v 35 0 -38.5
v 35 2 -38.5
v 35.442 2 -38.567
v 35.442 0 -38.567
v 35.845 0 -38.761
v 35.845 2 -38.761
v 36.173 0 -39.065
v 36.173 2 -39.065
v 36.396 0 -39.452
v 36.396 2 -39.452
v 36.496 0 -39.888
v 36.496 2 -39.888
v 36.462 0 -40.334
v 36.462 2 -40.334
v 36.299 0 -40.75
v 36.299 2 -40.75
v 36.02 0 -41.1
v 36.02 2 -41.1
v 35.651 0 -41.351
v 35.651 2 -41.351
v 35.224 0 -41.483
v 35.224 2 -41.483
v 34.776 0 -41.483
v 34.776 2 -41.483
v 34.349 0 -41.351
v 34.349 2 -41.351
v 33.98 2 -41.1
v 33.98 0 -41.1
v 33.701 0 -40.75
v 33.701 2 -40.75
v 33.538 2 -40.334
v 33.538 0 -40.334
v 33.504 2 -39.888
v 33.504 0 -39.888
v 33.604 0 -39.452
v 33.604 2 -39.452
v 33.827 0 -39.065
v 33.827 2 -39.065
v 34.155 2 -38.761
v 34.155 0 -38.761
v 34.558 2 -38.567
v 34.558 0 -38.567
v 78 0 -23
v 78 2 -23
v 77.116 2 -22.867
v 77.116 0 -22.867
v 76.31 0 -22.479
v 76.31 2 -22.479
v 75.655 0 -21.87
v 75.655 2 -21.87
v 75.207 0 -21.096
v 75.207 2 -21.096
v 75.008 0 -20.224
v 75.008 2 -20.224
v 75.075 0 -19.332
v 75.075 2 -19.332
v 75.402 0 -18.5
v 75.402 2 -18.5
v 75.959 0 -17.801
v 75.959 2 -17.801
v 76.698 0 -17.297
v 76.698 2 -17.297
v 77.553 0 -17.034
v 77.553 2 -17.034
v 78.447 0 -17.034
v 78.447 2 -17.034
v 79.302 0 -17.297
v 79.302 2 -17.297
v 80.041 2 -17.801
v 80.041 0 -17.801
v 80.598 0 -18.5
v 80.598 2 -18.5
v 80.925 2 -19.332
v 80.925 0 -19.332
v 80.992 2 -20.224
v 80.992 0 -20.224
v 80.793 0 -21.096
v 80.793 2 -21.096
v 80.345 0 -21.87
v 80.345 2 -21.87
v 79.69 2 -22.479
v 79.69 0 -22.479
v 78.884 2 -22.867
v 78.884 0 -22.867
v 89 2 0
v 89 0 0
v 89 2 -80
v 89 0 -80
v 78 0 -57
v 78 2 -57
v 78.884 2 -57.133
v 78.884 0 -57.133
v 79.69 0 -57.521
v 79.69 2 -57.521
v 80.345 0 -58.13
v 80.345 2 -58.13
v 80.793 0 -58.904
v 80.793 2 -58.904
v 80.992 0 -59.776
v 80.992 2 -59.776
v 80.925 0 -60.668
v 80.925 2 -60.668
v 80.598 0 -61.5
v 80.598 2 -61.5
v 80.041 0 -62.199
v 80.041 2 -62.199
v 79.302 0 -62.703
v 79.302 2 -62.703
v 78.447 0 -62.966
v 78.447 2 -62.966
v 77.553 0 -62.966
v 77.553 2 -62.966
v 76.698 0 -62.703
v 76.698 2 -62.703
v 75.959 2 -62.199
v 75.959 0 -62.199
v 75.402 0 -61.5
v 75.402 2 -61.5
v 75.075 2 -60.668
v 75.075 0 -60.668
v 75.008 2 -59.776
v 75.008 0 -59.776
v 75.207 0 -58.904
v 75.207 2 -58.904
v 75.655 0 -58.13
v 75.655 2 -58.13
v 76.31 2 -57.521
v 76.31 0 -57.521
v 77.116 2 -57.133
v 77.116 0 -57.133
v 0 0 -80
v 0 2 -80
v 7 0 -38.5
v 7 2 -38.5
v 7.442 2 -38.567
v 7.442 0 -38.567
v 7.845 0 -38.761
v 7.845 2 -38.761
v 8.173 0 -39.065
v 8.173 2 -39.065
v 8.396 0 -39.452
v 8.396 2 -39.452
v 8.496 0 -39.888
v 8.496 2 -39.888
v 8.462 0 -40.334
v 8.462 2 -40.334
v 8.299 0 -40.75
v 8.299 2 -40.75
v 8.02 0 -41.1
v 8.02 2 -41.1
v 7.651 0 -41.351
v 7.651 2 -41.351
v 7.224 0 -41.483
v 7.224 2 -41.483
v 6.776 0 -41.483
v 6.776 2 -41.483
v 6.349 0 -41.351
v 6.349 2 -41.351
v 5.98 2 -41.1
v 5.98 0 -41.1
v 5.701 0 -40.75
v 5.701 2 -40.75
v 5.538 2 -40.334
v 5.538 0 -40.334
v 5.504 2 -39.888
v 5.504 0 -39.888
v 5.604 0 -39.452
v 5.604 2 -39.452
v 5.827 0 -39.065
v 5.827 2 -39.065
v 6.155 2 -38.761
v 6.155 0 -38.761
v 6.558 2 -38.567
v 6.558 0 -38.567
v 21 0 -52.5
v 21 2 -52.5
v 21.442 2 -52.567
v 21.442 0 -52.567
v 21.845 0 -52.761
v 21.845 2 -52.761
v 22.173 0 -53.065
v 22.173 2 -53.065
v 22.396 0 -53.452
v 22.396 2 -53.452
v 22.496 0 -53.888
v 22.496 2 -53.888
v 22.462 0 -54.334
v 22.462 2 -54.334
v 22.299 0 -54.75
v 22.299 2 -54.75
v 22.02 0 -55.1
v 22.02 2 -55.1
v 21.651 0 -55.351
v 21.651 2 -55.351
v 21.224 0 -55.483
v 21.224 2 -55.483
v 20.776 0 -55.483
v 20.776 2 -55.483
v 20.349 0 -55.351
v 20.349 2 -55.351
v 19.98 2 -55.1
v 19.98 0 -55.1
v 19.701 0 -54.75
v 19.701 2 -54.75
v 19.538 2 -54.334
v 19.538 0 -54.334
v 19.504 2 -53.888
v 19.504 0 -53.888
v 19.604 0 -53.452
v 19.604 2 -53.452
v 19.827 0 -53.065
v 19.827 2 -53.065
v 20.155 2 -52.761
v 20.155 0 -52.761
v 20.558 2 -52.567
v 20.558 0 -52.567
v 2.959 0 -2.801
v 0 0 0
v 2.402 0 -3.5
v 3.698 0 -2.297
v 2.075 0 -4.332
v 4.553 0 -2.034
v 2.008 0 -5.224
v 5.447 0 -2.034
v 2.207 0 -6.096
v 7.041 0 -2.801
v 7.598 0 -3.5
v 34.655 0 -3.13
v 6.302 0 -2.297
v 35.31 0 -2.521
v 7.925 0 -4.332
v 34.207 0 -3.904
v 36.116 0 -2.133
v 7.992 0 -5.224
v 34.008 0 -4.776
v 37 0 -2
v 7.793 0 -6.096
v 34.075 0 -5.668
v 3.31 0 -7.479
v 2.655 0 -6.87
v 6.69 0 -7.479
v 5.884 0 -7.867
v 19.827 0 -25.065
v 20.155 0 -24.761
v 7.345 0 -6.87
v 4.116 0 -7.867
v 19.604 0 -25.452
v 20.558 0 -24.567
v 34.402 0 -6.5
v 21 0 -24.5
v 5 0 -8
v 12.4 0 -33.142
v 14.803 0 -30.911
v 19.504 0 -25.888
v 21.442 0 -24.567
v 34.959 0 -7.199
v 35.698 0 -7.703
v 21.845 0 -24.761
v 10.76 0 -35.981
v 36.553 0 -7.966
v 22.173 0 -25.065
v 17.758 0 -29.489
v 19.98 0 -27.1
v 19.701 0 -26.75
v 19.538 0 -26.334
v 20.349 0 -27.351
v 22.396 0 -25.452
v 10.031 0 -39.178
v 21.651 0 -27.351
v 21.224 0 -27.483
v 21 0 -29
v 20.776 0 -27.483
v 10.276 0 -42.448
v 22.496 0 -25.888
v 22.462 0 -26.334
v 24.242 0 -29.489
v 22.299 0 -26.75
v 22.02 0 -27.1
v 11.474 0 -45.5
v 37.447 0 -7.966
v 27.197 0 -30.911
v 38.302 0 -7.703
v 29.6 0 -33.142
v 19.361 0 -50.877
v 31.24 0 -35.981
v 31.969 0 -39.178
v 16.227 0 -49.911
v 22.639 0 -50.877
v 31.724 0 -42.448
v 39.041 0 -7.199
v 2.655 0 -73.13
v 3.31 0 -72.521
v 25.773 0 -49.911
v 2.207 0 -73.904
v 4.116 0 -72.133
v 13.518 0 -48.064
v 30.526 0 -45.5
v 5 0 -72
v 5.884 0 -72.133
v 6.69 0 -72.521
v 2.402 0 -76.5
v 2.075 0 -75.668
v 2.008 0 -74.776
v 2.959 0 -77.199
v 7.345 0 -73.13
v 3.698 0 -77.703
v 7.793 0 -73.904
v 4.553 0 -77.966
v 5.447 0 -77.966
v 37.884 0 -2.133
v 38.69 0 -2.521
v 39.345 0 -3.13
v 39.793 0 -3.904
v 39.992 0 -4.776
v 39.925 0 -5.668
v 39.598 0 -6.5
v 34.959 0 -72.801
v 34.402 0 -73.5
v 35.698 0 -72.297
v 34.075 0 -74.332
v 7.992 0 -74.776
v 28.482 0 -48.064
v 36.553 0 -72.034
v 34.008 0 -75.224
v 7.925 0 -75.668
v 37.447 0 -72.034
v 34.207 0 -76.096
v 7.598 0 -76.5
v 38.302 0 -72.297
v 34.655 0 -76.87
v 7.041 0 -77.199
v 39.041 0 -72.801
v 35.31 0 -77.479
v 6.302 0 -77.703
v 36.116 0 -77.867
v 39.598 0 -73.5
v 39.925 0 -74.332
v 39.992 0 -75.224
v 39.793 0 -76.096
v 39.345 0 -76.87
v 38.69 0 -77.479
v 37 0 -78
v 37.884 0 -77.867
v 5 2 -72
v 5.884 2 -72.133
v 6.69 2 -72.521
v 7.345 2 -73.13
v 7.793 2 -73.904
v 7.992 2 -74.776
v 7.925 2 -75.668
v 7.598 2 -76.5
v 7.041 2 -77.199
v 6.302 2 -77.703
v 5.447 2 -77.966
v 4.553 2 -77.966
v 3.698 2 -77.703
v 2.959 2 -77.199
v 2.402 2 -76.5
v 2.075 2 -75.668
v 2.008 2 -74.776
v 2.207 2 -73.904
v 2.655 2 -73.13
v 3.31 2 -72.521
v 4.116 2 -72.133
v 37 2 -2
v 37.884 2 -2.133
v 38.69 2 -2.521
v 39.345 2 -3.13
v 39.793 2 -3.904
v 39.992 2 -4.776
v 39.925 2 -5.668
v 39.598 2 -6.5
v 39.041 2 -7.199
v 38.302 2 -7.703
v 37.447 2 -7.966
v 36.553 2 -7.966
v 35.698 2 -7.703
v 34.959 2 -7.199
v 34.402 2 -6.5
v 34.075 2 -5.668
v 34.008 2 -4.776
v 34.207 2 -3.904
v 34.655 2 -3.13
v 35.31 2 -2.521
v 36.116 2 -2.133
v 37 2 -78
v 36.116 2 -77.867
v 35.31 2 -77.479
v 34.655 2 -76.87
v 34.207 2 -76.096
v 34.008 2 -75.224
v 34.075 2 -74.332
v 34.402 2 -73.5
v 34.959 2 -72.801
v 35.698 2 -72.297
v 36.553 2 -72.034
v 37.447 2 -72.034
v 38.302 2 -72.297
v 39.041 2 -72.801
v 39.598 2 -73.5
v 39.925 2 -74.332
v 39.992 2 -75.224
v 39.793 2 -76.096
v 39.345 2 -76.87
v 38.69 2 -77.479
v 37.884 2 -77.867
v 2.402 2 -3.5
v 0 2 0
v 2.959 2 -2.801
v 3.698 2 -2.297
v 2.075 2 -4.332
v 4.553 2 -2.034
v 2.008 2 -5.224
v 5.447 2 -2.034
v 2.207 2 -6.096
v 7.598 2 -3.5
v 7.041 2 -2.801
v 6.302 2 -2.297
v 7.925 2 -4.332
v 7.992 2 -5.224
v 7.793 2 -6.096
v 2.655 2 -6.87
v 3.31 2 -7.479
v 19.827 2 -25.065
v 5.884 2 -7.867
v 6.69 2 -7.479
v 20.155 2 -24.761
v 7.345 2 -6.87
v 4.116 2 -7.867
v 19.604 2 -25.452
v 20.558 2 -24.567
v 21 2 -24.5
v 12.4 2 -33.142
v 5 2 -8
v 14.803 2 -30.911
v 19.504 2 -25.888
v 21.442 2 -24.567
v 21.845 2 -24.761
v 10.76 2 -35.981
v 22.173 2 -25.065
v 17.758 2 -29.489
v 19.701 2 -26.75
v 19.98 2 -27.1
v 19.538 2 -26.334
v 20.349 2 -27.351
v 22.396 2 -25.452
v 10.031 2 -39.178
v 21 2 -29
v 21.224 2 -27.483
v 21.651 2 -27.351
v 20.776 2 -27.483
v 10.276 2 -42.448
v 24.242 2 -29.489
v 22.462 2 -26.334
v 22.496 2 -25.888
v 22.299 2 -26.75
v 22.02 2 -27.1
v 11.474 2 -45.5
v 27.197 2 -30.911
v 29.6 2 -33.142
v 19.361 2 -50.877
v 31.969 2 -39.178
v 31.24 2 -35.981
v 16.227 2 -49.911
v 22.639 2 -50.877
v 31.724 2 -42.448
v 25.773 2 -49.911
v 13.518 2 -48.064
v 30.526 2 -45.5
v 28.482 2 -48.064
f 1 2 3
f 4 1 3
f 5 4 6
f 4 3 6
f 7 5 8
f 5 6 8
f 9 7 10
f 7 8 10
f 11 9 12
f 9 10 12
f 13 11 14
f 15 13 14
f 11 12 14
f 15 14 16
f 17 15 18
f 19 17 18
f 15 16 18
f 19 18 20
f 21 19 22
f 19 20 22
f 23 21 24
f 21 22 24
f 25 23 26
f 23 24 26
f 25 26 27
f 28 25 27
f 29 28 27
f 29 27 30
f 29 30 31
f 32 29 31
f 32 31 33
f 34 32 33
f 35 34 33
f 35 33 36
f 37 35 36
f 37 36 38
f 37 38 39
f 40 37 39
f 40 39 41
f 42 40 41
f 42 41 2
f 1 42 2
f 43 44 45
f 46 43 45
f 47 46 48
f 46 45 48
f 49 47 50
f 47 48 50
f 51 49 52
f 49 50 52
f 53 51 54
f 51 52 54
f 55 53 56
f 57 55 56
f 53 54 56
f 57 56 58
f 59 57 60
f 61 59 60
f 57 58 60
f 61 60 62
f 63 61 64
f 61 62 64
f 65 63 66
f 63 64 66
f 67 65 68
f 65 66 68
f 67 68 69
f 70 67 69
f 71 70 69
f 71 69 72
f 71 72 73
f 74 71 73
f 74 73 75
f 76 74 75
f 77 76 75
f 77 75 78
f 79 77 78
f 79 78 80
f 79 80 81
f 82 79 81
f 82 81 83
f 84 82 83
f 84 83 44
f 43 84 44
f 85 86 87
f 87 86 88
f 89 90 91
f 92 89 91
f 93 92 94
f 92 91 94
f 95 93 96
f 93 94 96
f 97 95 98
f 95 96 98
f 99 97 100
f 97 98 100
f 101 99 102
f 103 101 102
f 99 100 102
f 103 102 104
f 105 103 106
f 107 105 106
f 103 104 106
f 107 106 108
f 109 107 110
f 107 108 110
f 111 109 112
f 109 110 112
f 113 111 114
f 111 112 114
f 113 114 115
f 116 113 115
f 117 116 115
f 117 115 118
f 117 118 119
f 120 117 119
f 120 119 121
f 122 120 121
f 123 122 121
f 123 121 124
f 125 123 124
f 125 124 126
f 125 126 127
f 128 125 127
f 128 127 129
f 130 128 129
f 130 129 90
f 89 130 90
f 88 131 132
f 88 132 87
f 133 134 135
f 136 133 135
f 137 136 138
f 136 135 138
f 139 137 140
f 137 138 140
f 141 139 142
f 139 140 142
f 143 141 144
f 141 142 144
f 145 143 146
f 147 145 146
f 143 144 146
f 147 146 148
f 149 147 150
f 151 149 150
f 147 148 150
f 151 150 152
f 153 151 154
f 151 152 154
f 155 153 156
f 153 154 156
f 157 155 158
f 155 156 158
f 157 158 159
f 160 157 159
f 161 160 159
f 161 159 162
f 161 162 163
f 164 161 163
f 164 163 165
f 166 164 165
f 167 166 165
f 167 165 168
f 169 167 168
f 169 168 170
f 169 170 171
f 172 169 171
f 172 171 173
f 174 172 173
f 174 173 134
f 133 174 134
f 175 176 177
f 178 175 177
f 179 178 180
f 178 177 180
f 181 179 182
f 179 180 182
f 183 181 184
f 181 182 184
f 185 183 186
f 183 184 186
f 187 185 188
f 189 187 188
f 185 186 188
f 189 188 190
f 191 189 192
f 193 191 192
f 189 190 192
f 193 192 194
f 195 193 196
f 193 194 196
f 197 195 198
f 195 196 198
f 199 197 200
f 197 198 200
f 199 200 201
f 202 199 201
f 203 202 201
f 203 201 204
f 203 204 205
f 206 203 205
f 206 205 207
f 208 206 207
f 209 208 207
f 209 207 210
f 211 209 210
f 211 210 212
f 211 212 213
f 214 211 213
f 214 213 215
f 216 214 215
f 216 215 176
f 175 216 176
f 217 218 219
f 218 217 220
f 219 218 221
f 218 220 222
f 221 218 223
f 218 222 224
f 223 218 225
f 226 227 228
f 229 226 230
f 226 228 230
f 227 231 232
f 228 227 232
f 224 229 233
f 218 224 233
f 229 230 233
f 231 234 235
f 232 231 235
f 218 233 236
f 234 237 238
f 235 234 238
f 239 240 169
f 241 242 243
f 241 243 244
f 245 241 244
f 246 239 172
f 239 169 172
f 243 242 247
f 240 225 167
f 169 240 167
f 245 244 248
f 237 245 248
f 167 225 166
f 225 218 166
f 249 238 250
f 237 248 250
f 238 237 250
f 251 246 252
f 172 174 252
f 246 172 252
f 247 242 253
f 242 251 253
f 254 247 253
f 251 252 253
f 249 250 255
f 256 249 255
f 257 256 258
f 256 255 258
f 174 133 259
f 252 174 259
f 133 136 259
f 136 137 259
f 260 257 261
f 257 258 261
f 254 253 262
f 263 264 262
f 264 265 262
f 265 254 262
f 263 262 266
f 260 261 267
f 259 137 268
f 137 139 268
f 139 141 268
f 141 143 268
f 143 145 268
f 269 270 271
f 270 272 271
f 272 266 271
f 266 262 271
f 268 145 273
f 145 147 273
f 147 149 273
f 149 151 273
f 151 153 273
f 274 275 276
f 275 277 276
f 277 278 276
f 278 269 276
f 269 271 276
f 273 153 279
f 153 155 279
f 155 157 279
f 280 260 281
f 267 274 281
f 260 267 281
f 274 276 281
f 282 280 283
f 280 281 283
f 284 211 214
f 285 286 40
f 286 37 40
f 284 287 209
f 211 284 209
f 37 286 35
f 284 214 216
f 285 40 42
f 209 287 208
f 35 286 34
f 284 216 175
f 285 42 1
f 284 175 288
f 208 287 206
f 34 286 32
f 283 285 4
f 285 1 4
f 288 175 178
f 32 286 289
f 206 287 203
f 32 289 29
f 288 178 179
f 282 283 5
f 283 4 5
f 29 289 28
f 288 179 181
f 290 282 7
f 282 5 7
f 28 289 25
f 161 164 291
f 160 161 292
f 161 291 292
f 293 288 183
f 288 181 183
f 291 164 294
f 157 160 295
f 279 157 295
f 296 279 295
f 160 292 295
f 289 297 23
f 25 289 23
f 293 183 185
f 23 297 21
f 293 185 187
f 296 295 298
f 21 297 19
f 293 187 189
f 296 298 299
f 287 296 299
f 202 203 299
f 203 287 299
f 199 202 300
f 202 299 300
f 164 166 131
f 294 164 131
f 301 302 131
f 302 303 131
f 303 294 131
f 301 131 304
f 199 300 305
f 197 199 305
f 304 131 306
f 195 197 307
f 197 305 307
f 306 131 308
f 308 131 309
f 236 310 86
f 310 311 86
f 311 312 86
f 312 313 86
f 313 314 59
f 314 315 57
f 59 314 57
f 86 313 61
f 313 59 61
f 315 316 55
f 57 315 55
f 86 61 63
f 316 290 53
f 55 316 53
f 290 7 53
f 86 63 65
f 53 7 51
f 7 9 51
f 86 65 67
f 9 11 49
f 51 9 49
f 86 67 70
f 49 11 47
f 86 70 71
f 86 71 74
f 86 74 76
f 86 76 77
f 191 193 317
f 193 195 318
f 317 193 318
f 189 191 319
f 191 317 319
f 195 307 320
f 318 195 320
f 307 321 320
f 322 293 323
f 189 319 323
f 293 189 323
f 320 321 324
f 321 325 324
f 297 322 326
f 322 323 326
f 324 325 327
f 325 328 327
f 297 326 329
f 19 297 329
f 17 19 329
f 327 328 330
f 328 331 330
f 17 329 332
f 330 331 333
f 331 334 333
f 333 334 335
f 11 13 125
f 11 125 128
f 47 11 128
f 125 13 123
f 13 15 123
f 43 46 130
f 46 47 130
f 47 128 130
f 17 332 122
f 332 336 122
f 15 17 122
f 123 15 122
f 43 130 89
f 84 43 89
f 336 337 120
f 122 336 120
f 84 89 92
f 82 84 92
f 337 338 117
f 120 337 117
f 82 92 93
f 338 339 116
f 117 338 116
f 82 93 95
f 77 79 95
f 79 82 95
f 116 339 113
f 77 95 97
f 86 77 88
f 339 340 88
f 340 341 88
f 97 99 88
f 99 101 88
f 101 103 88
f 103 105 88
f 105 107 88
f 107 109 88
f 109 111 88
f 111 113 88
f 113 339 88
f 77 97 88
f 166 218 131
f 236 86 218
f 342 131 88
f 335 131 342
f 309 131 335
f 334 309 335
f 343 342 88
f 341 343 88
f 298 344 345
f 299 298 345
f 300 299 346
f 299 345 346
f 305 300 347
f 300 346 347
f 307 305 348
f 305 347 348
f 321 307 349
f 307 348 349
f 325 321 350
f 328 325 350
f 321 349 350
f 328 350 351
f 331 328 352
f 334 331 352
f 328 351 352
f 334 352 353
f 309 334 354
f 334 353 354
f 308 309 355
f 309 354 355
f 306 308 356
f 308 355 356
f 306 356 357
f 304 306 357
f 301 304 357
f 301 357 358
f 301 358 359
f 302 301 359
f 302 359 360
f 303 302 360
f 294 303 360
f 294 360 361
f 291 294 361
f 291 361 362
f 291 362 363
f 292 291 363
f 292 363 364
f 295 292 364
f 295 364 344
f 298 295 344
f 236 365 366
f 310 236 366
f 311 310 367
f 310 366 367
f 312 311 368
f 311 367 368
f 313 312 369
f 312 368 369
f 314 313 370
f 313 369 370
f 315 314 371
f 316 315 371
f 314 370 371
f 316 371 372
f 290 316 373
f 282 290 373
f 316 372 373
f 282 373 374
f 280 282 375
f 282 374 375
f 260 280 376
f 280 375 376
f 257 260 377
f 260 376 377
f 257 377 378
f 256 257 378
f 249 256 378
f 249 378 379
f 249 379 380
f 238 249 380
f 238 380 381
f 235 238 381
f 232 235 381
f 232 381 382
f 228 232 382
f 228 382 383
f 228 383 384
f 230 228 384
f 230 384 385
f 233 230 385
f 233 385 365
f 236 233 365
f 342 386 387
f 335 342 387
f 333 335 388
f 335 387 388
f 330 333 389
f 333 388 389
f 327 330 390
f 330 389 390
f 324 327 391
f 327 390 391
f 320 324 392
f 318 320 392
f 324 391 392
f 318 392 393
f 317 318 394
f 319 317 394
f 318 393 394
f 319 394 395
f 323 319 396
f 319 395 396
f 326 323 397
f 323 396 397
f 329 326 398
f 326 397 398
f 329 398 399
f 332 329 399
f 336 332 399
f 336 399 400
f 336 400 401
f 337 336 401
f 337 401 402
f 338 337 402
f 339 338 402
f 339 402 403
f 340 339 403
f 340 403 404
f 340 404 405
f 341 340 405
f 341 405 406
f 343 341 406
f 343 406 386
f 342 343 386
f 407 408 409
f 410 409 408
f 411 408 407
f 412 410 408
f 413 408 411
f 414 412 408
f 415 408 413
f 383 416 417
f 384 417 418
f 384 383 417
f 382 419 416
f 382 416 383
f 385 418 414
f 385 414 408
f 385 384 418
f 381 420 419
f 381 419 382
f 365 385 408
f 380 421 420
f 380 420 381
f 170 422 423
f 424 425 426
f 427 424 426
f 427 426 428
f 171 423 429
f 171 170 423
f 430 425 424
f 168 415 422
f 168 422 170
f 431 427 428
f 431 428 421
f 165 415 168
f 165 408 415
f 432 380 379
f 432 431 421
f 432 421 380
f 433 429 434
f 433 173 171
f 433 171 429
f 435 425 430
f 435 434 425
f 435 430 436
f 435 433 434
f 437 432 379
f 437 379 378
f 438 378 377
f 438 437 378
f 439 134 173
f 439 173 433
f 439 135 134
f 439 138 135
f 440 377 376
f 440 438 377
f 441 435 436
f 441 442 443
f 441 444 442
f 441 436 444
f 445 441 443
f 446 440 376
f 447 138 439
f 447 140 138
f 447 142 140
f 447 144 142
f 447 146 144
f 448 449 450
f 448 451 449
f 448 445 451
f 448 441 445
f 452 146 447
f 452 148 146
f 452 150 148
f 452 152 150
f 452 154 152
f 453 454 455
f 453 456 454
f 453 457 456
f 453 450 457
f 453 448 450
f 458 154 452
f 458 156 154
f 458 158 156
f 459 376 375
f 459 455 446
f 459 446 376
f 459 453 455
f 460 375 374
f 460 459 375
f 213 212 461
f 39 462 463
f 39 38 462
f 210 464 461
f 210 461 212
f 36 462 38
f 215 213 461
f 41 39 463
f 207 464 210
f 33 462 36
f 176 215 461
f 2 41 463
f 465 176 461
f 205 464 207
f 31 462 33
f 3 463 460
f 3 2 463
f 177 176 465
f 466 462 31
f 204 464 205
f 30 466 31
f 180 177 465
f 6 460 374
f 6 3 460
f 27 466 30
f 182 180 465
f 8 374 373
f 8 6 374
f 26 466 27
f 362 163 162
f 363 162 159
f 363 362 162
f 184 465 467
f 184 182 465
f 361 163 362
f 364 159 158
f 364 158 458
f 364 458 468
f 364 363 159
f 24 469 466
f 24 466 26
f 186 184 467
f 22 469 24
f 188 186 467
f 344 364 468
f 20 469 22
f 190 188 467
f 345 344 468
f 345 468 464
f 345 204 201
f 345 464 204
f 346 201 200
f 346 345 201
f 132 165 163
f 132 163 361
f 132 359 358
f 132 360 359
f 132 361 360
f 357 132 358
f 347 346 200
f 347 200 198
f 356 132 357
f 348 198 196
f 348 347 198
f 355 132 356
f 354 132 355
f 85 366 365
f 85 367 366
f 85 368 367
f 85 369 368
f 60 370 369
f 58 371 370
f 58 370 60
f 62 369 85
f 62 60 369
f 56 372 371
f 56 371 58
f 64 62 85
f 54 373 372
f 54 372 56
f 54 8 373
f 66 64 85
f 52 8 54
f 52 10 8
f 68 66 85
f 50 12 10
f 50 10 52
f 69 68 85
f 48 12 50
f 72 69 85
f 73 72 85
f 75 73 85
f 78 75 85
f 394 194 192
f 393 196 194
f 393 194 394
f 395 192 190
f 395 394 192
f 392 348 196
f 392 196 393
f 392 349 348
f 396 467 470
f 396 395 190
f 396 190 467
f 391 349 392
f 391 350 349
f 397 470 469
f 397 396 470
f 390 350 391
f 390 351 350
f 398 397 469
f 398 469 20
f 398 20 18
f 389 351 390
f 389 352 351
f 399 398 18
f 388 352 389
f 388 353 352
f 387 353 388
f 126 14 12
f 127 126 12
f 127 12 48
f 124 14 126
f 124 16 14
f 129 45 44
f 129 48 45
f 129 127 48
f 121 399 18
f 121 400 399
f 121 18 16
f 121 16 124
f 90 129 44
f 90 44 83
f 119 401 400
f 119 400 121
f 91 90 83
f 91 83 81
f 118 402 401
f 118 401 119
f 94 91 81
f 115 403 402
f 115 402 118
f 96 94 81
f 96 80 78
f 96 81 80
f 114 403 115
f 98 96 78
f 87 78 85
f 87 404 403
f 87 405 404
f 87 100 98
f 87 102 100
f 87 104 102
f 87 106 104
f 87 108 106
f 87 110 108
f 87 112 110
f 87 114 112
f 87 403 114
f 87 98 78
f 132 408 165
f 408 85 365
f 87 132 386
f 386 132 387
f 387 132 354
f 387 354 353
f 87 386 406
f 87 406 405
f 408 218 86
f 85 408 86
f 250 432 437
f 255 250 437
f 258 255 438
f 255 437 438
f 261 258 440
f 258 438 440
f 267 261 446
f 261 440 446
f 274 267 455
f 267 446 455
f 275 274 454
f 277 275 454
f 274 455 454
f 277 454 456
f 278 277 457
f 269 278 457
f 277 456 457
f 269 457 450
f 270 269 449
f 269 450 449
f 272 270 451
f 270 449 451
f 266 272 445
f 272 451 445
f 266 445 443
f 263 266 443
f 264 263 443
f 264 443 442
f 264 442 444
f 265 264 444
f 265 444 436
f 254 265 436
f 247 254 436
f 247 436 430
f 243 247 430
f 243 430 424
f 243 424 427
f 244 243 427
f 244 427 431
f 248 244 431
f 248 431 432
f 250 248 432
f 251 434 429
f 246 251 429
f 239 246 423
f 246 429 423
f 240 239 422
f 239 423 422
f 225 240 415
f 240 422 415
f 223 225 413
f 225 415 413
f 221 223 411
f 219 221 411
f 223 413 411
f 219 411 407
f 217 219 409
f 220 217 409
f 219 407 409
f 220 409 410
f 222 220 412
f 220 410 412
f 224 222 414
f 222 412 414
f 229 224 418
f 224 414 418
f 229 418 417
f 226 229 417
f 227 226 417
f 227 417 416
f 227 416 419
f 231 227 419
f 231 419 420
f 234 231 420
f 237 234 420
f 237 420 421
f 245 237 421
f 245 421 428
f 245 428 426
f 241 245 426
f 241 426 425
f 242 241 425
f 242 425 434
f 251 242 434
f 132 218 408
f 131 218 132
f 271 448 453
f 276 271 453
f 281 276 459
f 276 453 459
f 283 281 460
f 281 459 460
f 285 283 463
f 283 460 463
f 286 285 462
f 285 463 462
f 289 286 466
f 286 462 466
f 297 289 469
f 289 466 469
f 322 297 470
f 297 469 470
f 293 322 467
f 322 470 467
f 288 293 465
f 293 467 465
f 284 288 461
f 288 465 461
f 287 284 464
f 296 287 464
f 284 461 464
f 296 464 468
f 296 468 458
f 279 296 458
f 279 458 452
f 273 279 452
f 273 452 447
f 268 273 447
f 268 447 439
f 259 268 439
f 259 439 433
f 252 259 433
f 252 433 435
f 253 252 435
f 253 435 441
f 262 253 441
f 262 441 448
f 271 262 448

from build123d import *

# Parameters (mm, degrees)
ESQUISSE1_W      = 89
ESQUISSE1_H      = 80
EXTRUSION1_DEPTH = 2
ESQUISSE2_R      = 11
EXTRUSION3_DEPTH = 120.687092036
ESQUISSE4_R      = 1.5
ESQUISSE4_R_2    = 3
EXTRUSION4_DEPTH = 120.687092036


with BuildPart() as part:
    # Esquisse1 → Extrusion1 (new body)
    with BuildSketch(Plane(origin=(0, 0, 0), x_dir=(1, 0, 0), z_dir=(0, 1, 0))):
        with Locations((44.5, 40)):
            Rectangle(ESQUISSE1_W, ESQUISSE1_H)
    extrude(amount=EXTRUSION1_DEPTH)

    # Esquisse2 → Extrusion3 (cut, through all)
    with BuildSketch(Plane(origin=(0, 2, 0), x_dir=(1, 0, 0), z_dir=(0, 1, 0))):
        with Locations(Location((21, 40, 0), (0, 0, 270))):
            Circle(ESQUISSE2_R)
    extrude(amount=-EXTRUSION3_DEPTH, mode=Mode.SUBTRACT)

    # Esquisse4 → Extrusion4 (cut, through all)
    with BuildSketch(Plane(origin=(0, 2, 0), x_dir=(-1, 0, 0), z_dir=(0, 1, 0))):
        with Locations(Location((-35, -40, 0), (0, 0, 90))):
            Circle(ESQUISSE4_R)
        with Locations(Location((-21, -26, 0), (0, 0, 90))):
            Circle(ESQUISSE4_R)
        with Locations(Location((-7, -40, 0), (0, 0, 90))):
            Circle(ESQUISSE4_R)
        with Locations(Location((-21, -54, 0), (0, 0, 90))):
            Circle(ESQUISSE4_R)
        with Locations(Location((-5, -75, 0), (0, 0, 90))):
            Circle(ESQUISSE4_R_2)
        with Locations(Location((-5, -5, 0), (0, 0, 270))):
            Circle(ESQUISSE4_R_2)
        with Locations(Location((-37, -5, 0), (0, 0, 90))):
            Circle(ESQUISSE4_R_2)
        with Locations(Location((-37, -75, 0), (0, 0, 270))):
            Circle(ESQUISSE4_R_2)
        with Locations(Location((-78, -60, 0), (0, 0, 90))):
            Circle(ESQUISSE4_R_2)
        with Locations(Location((-78, -20, 0), (0, 0, 270))):
            Circle(ESQUISSE4_R_2)
    extrude(amount=-EXTRUSION4_DEPTH, mode=Mode.SUBTRACT)


solid = part.part
